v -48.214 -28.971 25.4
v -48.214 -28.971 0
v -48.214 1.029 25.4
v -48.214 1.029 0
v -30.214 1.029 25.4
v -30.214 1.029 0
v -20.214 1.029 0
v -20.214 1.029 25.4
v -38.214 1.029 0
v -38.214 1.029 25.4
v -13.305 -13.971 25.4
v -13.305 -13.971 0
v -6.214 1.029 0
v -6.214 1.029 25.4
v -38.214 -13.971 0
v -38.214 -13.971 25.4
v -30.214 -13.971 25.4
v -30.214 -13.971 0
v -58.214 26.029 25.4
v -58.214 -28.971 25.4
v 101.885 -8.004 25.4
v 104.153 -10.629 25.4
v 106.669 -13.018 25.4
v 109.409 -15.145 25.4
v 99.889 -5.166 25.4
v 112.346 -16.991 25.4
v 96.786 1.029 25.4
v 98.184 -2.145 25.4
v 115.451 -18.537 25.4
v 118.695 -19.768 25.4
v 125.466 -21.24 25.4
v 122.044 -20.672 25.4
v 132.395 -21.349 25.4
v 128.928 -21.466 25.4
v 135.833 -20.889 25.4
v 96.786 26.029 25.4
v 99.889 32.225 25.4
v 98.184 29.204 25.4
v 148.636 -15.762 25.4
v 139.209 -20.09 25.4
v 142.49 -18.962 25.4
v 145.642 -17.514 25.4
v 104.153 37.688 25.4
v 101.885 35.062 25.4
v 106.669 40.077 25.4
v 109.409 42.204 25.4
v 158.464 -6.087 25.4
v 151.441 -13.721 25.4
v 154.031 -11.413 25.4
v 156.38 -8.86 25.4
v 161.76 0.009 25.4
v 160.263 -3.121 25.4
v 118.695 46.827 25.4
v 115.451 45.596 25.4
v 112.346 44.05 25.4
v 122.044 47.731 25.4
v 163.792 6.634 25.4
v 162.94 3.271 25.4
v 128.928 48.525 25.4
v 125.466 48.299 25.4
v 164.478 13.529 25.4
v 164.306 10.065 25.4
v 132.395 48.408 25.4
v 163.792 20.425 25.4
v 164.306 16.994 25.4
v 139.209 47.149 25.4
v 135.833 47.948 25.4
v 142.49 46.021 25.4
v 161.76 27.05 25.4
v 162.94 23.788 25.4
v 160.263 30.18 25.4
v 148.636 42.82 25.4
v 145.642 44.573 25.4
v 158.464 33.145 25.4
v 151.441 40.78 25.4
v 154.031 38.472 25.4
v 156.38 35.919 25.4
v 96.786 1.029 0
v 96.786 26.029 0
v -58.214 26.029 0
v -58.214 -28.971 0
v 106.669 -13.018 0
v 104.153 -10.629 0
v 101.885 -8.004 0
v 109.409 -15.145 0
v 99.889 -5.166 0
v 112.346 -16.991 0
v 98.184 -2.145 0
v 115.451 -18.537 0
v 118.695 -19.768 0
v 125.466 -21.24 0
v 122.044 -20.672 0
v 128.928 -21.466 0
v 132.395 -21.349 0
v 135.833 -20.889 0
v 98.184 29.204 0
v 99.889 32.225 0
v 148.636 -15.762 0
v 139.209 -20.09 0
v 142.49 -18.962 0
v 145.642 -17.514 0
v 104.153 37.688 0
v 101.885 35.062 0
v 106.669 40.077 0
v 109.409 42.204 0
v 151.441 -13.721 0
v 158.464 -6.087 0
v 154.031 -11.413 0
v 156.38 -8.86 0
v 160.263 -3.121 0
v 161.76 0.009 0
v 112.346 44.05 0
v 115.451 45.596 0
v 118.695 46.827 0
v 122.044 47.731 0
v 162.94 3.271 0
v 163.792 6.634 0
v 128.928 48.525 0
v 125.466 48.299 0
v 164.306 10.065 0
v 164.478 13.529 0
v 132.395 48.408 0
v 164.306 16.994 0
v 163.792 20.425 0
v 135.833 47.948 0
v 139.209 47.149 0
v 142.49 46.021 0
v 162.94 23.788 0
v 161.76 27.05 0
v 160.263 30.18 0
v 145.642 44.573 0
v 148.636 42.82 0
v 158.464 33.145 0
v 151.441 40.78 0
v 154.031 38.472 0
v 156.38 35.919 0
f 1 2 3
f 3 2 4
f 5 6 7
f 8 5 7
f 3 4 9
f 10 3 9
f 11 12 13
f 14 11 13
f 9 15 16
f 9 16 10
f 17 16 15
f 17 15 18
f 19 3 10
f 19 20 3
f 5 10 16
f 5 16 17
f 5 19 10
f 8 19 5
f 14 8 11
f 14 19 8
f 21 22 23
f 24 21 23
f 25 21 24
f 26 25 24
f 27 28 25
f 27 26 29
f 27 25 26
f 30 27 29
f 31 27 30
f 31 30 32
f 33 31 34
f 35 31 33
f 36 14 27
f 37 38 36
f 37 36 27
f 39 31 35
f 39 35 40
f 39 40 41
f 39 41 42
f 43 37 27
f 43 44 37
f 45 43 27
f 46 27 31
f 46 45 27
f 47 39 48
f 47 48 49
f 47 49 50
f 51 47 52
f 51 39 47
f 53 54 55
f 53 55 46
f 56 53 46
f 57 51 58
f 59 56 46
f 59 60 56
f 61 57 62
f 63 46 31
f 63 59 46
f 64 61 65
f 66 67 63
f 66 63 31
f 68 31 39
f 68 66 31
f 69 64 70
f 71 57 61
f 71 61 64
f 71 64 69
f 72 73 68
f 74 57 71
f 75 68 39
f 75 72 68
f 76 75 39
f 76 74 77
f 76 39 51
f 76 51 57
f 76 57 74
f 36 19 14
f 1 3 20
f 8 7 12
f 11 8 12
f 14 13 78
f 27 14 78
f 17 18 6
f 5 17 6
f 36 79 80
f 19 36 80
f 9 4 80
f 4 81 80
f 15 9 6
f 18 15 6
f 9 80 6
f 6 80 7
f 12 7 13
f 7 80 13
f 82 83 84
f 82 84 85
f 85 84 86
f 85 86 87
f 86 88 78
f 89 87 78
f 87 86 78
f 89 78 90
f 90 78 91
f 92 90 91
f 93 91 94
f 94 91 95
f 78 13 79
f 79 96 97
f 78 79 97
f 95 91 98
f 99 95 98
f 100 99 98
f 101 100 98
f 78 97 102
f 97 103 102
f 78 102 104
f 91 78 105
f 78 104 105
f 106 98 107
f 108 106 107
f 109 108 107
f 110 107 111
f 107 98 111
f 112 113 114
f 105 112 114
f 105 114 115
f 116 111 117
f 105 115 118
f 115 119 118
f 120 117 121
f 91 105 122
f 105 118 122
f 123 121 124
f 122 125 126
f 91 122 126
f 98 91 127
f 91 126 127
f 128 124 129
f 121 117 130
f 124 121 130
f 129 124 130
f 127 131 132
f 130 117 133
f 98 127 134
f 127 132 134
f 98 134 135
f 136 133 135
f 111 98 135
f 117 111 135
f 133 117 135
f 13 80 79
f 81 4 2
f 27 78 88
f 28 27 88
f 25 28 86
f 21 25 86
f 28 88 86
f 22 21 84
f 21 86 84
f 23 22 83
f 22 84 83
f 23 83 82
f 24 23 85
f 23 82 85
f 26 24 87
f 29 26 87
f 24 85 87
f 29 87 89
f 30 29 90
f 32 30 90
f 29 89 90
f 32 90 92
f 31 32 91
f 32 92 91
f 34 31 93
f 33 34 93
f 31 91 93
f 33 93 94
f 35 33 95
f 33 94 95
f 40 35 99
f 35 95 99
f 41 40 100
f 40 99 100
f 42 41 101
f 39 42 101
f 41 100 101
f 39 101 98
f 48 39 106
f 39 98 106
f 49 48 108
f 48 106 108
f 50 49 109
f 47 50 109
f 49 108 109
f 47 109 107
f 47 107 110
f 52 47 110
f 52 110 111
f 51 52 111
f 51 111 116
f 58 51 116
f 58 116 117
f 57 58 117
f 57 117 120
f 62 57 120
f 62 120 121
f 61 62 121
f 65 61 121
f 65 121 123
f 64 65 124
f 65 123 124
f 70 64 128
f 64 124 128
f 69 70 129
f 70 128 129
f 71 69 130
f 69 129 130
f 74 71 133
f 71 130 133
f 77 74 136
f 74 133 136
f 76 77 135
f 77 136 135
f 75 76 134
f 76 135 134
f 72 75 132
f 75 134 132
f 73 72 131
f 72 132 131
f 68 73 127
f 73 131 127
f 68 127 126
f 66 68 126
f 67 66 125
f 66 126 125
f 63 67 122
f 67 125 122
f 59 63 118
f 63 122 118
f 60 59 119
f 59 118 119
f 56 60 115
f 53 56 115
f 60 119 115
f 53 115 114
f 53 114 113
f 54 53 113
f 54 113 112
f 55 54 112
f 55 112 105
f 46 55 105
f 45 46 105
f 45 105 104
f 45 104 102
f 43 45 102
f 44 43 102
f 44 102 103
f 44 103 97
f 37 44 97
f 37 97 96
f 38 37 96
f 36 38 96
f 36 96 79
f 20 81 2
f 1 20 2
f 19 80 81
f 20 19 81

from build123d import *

# Parameters (mm, degrees)
F0_R     = 17.5
F0_W     = 10
F0_H     = 30
F0_W_2   = 8
F0_H_2   = 15
F1_DEPTH = 25.4


with BuildPart() as f1:
    # F0 (on Top) → F1 (new body)
    with BuildSketch(Plane.XY):
        Polygon((96.7858138128, 1.0294117647), (96.7858138128, 26.0294117647), (-58.2141861872, 26.0294117647), (-58.2141861872, 1.0294117647), (-48.2141861872, 1.0294117647), (-38.2141861872, 1.0294117647), (-30.2141861872, 1.0294117647), (-20.2141861872, 1.0294117647), (-6.2141861872, 1.0294117647), align=None)
        with BuildLine():
            ThreePointArc((96.7858138128, 1.0294117647), (164.4775558894, 13.5294117647), (96.7858138128, 26.0294117647))
            Line((96.7858138128, 26.0294117647), (96.7858138128, 1.0294117647))
        make_face()
        with Locations((129.4775558894, 13.5294117647)):
            Circle(F0_R, mode=Mode.SUBTRACT)
        with Locations((129.4775558894, 13.5294117647)):
            Circle(F0_R)
        with Locations((-53.2141861872, -13.9705882353)):
            Rectangle(F0_W, F0_H)
        with Locations((-34.2141861872, -6.4705882353)):
            Rectangle(F0_W_2, F0_H_2)
        Polygon((-13.3046329277, -13.9705882353), (-6.2141861872, 1.0294117647), (-20.2141861872, 1.0294117647), align=None)
    extrude(amount=F1_DEPTH)


solid = f1.part
